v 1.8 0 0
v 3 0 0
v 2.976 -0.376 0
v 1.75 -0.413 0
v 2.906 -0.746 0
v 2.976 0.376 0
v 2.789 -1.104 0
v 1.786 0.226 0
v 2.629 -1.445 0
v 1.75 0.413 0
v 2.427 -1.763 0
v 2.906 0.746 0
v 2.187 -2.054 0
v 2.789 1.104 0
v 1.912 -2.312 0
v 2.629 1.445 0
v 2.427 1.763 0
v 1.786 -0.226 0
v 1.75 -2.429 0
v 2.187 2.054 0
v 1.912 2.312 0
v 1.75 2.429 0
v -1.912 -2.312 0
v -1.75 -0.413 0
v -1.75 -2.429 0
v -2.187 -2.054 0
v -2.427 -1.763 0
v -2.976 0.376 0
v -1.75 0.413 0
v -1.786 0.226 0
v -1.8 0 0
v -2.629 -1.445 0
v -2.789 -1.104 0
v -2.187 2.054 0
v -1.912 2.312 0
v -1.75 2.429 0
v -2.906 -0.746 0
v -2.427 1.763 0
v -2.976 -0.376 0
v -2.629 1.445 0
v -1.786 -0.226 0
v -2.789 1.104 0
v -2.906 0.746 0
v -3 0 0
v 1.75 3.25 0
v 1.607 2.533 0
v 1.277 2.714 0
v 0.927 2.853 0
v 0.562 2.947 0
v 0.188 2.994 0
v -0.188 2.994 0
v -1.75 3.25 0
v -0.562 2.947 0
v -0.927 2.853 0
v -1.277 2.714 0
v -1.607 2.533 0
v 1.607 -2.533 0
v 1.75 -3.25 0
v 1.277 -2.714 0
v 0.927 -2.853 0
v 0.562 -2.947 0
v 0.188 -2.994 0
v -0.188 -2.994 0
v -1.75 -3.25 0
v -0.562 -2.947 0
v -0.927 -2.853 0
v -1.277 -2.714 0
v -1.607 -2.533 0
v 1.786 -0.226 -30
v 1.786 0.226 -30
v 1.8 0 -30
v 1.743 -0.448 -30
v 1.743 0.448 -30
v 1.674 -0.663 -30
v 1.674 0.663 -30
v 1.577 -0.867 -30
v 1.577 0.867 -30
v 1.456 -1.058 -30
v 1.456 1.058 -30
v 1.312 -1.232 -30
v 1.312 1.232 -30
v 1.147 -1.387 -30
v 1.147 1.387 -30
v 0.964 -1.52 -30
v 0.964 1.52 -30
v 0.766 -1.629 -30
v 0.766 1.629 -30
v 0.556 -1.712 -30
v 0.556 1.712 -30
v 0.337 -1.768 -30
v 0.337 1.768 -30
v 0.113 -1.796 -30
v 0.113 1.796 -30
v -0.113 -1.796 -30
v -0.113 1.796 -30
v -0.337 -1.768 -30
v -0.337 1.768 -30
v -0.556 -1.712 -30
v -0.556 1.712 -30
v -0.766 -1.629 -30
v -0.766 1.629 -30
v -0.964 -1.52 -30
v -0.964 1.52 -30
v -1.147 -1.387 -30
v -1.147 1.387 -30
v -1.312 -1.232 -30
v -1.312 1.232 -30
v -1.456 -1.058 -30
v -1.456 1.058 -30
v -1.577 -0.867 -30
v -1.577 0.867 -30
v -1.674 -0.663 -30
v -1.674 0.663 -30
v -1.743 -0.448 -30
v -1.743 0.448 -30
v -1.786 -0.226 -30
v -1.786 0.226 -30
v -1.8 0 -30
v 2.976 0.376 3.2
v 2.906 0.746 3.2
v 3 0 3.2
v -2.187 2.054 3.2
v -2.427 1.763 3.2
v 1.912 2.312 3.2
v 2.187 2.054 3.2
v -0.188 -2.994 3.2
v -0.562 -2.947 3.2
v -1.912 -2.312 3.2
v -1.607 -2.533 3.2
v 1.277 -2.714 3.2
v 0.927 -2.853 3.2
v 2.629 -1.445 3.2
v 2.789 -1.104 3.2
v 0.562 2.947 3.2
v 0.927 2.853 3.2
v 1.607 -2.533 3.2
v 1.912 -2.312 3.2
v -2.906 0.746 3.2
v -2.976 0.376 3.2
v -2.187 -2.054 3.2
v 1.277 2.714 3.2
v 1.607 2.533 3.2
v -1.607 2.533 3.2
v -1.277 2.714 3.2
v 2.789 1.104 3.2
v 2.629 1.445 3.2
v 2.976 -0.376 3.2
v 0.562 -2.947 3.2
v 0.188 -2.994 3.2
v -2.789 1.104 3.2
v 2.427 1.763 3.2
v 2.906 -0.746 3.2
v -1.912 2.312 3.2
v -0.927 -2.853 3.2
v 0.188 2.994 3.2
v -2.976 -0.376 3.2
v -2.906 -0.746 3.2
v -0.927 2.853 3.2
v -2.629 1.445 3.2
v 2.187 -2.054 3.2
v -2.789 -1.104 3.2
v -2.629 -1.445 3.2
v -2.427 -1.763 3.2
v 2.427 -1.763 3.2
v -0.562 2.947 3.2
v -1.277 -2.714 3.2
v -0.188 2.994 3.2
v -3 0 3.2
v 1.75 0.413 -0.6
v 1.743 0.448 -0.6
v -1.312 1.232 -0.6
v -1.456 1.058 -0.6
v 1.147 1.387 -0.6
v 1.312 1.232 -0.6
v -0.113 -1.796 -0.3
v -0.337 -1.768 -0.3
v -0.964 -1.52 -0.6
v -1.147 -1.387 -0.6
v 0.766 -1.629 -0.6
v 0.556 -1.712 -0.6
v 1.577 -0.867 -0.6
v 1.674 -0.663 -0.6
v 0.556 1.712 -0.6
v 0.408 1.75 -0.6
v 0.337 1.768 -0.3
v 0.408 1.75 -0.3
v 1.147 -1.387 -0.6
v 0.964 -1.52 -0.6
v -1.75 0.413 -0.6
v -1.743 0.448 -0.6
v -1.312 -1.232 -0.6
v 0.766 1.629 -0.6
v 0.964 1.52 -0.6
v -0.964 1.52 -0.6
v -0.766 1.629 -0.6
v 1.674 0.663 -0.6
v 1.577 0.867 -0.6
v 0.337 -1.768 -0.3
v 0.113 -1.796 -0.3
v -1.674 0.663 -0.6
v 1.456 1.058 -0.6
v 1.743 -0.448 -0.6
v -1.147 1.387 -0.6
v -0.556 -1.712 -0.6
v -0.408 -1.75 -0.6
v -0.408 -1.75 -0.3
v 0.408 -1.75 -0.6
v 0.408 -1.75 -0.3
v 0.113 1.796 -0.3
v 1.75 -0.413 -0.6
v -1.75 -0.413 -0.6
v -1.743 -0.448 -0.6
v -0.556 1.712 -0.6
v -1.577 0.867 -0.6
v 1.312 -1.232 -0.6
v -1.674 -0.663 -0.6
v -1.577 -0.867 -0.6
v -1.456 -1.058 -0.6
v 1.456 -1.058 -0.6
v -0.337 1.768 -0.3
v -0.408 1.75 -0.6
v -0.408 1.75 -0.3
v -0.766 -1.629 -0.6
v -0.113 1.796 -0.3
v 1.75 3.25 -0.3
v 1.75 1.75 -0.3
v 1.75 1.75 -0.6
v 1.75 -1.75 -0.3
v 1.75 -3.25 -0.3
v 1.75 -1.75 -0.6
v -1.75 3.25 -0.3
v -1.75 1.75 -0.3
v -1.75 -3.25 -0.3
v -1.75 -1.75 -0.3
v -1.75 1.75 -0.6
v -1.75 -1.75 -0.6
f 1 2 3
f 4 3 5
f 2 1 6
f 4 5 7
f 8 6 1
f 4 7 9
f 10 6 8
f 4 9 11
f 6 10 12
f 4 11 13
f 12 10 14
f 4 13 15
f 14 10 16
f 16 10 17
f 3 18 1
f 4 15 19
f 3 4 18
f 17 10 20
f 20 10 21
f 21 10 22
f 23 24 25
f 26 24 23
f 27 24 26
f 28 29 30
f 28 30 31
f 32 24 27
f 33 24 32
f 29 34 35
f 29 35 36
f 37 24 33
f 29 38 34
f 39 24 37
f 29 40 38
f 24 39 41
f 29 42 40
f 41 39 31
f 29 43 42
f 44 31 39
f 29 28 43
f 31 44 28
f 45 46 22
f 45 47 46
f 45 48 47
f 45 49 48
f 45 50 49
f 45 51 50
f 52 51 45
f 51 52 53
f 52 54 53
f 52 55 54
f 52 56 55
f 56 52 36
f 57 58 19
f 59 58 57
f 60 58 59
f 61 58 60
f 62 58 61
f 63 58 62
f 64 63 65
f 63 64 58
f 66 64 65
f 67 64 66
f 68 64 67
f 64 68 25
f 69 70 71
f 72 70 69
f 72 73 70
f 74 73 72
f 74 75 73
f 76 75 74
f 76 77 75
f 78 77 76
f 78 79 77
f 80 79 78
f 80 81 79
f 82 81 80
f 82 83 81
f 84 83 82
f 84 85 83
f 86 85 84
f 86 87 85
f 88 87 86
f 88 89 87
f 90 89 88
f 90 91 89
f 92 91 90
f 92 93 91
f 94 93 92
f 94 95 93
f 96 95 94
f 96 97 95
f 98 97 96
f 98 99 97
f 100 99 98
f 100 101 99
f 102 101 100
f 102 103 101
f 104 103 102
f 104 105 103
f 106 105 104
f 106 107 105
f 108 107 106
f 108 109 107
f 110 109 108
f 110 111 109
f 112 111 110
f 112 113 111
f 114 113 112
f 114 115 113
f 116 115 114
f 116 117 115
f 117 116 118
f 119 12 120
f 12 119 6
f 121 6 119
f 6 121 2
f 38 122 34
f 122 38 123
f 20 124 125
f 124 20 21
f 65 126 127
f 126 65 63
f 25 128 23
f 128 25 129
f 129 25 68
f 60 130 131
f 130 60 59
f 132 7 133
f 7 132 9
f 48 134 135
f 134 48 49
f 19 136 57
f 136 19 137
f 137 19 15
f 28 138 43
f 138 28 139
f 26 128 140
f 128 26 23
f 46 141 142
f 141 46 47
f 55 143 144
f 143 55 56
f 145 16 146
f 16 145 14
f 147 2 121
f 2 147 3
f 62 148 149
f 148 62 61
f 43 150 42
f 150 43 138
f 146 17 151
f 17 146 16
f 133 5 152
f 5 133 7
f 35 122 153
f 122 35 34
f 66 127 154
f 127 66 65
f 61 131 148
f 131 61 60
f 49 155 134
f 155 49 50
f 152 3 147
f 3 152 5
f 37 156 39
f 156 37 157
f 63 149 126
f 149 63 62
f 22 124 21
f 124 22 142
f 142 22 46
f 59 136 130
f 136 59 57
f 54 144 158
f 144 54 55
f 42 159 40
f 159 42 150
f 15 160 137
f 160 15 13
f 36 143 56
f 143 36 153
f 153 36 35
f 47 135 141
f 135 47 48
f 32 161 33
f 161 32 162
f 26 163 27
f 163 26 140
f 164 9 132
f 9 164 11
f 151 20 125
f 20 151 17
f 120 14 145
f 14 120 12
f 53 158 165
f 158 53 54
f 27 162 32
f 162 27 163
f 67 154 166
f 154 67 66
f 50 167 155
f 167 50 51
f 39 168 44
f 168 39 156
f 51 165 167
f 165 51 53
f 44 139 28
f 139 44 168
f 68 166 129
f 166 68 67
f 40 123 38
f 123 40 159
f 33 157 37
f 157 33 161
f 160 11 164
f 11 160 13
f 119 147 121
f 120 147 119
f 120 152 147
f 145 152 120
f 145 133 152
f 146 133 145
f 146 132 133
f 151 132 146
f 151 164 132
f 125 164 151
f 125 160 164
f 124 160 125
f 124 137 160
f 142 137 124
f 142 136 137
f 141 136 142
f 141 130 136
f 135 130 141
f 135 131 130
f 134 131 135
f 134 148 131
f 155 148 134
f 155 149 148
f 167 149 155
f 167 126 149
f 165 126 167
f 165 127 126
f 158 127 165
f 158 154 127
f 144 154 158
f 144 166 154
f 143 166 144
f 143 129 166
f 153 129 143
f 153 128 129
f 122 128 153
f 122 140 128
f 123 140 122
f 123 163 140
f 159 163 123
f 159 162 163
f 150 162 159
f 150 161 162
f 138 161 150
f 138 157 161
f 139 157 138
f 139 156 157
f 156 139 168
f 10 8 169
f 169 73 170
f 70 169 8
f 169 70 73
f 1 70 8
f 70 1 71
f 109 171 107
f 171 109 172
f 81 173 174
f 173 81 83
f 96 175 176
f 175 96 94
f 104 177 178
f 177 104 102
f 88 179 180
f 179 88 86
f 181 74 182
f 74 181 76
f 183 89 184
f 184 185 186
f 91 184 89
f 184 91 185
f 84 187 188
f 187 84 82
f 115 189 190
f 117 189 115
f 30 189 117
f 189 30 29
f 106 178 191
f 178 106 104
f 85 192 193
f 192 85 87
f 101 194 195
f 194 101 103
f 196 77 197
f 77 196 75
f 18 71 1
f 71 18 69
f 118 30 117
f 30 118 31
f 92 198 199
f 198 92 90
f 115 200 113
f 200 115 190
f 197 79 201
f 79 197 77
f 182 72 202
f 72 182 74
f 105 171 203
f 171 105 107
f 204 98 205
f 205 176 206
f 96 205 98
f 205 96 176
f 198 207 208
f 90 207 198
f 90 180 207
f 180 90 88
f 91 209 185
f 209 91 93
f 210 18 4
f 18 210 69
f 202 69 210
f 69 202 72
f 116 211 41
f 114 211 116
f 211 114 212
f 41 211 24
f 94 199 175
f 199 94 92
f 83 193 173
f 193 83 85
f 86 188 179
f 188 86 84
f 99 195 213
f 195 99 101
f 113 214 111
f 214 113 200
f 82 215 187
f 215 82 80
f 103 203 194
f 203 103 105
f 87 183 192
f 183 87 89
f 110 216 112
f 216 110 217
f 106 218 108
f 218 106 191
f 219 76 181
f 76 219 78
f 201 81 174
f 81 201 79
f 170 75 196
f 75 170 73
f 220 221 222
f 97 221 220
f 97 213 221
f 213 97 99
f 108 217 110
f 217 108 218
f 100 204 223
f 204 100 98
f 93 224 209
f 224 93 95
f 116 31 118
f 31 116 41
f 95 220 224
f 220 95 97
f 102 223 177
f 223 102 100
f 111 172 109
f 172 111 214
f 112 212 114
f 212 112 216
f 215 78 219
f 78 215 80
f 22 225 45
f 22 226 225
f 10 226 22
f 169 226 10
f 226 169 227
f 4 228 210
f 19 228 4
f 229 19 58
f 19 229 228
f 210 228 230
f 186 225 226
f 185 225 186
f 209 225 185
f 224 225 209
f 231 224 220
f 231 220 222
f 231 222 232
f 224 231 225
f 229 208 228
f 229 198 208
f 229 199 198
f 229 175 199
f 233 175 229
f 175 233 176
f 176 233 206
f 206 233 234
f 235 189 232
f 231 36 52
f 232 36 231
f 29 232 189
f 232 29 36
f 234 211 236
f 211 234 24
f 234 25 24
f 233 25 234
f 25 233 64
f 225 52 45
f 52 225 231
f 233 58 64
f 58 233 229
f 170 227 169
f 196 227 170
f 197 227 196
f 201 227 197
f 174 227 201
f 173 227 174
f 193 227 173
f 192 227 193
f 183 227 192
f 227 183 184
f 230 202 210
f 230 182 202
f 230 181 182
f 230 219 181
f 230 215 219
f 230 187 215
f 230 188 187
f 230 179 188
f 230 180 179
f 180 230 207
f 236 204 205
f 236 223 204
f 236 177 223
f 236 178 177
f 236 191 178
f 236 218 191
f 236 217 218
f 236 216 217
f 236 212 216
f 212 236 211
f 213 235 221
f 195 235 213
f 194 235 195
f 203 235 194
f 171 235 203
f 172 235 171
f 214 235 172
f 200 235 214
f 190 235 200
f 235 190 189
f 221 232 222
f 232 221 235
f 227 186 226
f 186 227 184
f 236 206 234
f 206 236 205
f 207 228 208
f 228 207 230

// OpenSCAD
$fn = 50;


difference() {
	union() {
		translate(v = [0, 0, 0]) {
			rotate(a = [0, 0, 0]) {
				difference() {
					union() {
						translate(v = [0, 0, -30.0000000000]) {
							cylinder(h = 30, r = 1.5000000000);
						}
						cylinder(h = 3.2000000000, r = 3.0000000000);
						translate(v = [0, 0, -30.0000000000]) {
							cylinder(h = 30, r = 1.8000000000);
						}
						translate(v = [-1.7500000000, -3.2500000000, -0.3000000000]) {
							cube(size = [3.5000000000, 6.5000000000, 0.3000000000]);
						}
						translate(v = [-1.7500000000, -1.7500000000, -0.6000000000]) {
							cube(size = [3.5000000000, 3.5000000000, 0.3000000000]);
						}
						translate(v = [0, 0, -30.0000000000]) {
							cylinder(h = 30, r = 1.5000000000);
						}
					}
					union();
				}
			}
		}
	}
	union();
}
